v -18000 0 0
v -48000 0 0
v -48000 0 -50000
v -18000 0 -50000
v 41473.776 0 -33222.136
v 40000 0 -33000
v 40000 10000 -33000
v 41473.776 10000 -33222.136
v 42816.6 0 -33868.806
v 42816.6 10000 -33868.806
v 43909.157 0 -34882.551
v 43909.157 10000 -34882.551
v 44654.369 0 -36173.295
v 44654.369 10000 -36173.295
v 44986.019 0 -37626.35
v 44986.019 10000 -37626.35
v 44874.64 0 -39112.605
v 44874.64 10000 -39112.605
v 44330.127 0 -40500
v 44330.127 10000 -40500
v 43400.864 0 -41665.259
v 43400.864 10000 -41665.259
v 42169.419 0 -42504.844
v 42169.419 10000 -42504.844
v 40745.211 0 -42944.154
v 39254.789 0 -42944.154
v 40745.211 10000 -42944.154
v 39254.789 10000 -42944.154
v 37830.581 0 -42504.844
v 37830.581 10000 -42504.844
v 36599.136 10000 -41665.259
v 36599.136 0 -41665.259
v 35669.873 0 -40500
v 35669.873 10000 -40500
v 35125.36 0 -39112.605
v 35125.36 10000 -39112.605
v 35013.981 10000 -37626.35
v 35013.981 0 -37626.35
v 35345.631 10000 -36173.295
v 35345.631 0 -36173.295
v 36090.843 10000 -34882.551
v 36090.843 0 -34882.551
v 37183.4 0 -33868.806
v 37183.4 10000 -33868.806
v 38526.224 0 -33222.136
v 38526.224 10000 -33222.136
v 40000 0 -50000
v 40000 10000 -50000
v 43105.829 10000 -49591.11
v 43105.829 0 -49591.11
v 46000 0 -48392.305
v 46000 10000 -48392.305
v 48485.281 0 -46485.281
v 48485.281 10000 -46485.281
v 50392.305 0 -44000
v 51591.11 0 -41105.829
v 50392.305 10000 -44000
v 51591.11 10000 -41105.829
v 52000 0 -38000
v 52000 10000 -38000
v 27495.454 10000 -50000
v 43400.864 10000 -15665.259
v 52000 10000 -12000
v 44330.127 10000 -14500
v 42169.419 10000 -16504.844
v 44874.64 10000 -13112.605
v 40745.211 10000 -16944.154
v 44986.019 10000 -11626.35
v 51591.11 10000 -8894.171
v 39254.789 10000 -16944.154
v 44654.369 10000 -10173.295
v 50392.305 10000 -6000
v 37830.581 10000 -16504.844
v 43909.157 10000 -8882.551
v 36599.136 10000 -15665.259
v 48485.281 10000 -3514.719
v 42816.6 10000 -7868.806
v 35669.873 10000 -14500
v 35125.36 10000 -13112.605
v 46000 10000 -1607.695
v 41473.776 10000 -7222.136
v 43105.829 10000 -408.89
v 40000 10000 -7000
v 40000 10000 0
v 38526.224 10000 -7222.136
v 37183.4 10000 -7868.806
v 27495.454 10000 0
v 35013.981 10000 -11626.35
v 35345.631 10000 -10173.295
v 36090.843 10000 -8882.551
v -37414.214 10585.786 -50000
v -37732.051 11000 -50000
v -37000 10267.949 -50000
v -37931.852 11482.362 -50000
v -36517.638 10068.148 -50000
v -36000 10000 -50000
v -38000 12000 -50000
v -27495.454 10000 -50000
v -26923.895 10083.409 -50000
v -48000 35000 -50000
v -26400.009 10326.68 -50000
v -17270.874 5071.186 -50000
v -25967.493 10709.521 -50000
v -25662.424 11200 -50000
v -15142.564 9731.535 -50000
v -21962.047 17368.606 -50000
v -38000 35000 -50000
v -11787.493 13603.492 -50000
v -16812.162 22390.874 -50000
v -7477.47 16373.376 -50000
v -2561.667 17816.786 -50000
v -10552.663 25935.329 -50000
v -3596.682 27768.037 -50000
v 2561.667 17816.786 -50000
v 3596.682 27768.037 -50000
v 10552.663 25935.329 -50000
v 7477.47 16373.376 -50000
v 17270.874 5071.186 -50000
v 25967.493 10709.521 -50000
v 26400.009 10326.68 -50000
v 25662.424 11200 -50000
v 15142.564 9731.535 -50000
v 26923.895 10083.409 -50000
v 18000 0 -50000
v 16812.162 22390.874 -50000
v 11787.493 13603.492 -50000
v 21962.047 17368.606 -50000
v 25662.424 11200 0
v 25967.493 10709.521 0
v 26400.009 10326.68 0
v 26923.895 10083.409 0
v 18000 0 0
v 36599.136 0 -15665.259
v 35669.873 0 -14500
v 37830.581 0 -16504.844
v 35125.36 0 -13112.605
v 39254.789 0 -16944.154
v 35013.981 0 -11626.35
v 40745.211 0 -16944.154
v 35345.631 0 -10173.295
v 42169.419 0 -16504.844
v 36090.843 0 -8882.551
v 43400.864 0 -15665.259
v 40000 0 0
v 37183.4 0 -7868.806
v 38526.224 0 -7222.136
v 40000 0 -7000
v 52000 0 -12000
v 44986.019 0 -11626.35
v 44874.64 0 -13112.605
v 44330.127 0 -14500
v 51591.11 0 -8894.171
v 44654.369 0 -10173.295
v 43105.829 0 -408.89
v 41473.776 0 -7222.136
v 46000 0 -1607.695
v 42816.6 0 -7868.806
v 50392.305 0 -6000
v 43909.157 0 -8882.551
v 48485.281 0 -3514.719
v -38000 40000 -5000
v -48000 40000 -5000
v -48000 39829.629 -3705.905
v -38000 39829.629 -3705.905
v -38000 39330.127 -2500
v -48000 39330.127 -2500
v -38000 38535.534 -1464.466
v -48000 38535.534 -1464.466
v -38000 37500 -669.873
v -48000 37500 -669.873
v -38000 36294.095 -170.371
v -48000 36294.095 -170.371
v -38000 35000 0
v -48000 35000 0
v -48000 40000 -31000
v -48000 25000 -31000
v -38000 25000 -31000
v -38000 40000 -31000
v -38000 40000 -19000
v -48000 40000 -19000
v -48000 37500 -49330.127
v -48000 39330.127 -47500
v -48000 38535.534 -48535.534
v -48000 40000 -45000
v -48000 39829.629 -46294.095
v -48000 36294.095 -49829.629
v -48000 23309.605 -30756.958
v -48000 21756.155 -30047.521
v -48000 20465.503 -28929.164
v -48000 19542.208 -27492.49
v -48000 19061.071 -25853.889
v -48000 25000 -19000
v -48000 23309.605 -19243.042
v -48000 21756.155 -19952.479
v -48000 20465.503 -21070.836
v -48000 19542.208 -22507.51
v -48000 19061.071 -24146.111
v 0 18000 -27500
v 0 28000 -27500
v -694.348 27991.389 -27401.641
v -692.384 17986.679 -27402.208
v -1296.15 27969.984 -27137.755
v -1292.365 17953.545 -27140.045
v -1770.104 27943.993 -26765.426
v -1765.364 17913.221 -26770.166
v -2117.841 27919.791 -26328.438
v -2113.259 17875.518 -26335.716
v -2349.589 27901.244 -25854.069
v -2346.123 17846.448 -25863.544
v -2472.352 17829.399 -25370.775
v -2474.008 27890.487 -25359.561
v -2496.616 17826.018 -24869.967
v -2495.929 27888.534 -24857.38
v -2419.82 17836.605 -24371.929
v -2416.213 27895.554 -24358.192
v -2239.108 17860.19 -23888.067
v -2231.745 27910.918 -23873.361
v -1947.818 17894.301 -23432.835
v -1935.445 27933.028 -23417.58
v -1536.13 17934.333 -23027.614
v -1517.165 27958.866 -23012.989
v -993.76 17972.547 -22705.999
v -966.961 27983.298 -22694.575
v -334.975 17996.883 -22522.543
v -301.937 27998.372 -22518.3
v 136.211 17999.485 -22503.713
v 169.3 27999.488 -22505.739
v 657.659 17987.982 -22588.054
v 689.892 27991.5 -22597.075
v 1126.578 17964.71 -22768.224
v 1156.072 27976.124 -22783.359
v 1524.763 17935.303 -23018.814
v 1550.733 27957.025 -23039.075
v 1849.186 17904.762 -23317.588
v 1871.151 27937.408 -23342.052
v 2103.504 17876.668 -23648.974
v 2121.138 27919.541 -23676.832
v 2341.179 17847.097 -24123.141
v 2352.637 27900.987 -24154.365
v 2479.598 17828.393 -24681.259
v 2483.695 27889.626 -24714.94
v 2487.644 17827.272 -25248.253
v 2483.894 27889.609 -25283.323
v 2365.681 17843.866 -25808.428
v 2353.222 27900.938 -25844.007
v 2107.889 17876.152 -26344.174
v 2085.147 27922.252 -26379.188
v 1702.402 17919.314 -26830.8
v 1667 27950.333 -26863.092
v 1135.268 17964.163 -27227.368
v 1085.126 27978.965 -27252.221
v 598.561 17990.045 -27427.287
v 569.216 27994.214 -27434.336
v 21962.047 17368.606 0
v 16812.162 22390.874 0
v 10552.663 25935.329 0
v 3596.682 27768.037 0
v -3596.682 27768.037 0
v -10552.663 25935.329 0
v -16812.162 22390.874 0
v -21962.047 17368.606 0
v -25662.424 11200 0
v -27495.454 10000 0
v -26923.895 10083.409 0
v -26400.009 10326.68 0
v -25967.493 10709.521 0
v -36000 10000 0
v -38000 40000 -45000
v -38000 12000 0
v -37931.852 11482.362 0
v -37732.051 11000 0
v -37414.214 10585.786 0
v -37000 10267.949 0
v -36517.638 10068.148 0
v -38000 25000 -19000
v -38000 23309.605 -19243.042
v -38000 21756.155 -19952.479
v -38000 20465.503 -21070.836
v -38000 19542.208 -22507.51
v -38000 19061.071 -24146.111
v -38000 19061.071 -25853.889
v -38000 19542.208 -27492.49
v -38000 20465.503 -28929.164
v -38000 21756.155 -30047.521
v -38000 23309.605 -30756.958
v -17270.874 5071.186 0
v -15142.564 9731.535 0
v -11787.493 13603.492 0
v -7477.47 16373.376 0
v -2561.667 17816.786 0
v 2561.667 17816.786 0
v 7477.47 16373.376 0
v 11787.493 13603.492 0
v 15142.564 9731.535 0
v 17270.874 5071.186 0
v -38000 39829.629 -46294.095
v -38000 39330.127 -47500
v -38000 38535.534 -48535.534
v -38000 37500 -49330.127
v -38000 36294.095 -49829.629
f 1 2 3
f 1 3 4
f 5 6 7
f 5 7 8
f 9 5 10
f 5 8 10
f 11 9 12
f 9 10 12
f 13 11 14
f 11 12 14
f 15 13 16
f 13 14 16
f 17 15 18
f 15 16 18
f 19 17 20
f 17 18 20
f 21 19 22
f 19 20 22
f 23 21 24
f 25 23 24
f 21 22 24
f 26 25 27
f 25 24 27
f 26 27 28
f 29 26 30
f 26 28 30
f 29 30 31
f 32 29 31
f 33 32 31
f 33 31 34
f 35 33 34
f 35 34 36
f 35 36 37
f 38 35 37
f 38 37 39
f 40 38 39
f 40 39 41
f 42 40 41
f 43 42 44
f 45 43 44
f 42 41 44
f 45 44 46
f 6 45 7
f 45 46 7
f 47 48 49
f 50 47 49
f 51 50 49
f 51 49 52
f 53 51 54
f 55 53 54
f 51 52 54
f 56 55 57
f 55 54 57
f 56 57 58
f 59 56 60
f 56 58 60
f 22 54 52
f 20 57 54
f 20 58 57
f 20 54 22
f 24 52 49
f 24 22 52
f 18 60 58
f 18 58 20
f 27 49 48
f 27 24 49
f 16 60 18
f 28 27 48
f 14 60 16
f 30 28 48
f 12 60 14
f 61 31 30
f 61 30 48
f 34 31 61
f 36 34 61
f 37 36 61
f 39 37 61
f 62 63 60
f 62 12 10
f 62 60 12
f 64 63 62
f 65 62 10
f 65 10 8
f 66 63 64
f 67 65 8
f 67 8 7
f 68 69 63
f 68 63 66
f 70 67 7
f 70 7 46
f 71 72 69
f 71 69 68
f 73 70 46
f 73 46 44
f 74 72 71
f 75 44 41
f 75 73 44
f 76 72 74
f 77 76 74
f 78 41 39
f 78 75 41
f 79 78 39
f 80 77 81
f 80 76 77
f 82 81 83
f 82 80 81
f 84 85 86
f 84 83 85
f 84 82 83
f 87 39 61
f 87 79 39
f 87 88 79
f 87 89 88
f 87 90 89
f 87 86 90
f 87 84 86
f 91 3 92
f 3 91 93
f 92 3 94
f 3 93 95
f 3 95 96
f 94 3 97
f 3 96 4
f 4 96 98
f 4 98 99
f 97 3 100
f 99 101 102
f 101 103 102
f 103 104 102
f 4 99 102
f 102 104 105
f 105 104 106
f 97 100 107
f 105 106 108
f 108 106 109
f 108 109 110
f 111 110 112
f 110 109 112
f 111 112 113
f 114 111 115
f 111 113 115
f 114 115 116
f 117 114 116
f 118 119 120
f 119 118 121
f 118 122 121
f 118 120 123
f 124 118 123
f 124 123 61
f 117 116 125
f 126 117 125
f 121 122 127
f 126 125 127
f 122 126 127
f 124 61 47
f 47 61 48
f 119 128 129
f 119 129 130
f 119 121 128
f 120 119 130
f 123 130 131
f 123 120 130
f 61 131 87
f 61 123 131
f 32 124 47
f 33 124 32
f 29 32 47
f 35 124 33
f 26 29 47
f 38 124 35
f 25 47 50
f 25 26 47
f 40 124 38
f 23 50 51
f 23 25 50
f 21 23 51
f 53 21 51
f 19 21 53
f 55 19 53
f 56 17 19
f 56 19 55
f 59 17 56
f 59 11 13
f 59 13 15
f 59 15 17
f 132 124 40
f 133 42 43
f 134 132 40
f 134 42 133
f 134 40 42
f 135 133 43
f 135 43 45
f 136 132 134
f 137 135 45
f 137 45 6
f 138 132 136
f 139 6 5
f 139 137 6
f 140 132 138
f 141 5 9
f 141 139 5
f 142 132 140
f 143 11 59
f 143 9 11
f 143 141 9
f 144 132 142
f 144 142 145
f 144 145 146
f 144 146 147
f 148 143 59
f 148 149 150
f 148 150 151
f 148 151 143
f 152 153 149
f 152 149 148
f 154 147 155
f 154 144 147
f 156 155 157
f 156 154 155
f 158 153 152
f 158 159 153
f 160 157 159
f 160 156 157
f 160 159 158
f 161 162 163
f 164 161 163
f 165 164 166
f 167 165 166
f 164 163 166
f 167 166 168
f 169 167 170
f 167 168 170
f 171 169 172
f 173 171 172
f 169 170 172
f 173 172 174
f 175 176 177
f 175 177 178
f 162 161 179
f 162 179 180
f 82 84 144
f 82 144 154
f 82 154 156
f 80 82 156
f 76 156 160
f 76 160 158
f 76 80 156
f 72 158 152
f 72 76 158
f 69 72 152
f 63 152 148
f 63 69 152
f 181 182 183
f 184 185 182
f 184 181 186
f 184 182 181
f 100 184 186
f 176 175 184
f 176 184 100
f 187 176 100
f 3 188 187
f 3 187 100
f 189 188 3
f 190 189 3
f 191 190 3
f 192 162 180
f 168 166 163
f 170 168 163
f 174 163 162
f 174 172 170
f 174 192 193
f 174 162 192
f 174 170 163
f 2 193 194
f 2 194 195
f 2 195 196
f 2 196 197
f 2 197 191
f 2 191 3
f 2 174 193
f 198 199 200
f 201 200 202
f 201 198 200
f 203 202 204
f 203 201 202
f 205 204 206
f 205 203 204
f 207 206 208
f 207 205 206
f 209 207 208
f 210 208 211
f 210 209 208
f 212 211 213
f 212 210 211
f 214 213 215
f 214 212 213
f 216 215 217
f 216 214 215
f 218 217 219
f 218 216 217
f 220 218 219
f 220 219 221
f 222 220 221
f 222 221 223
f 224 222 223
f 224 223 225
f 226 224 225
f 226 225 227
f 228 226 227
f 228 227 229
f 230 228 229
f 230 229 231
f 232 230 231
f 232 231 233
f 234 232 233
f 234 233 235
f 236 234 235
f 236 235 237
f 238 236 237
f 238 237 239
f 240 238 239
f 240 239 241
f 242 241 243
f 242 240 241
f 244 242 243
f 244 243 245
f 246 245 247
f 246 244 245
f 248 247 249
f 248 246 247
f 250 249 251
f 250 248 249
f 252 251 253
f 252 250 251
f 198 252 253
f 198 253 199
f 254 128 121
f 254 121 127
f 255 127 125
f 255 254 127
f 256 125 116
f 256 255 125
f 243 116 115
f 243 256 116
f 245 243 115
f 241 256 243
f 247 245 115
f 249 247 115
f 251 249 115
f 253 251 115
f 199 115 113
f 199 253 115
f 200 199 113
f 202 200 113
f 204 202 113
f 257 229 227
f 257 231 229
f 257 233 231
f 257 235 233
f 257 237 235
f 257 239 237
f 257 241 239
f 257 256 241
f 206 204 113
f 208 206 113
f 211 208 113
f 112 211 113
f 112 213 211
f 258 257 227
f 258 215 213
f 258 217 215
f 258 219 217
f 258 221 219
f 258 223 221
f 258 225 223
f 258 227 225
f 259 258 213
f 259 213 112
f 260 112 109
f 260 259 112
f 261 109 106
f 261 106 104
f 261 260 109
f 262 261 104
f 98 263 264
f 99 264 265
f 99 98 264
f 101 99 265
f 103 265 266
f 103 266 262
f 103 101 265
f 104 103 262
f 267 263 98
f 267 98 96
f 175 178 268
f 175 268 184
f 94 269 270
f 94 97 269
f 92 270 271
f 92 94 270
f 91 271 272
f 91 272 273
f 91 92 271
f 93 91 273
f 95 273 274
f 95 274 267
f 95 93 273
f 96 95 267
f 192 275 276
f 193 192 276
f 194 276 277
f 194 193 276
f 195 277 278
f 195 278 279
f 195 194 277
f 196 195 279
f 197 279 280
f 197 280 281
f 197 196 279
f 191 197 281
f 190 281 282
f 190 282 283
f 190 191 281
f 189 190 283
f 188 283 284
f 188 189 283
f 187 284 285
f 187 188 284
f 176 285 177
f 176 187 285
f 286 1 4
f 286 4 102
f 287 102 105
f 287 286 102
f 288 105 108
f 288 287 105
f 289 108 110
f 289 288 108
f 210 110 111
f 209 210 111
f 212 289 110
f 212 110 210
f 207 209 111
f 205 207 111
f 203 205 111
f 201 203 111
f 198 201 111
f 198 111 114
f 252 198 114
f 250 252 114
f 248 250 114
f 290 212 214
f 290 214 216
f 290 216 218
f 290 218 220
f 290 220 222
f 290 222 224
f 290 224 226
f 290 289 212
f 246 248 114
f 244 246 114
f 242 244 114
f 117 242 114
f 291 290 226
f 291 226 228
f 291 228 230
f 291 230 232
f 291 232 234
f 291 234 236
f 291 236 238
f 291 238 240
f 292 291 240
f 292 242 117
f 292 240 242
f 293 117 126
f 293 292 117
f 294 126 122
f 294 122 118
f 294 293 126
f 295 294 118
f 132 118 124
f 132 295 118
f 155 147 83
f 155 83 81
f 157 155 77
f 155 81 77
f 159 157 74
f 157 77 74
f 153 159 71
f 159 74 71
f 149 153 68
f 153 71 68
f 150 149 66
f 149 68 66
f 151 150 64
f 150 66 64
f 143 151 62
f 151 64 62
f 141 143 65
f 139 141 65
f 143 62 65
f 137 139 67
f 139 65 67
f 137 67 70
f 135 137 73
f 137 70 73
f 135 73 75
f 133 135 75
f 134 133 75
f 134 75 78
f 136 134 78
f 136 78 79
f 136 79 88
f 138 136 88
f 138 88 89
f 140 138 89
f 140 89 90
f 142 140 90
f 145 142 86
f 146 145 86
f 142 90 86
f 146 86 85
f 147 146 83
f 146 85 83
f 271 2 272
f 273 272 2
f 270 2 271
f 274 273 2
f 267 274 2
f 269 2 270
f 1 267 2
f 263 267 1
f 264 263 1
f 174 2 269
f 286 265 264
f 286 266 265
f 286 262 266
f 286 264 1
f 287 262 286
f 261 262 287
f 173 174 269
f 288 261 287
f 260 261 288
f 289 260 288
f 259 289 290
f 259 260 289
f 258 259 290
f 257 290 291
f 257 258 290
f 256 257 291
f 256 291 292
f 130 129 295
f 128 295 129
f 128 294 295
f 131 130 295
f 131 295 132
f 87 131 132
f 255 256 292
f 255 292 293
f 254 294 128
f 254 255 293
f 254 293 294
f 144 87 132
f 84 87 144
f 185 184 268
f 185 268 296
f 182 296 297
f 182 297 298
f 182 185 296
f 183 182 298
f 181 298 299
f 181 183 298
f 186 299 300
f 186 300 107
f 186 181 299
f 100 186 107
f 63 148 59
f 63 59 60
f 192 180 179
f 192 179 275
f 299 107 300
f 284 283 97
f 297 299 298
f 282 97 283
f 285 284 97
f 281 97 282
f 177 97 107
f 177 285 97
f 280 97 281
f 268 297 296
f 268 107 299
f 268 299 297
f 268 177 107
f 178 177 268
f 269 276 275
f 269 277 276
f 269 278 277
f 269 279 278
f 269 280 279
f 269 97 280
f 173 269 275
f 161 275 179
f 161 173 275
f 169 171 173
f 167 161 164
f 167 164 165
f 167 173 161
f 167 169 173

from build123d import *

# Parameters (mm, degrees)
BOSS_EXTRUDE1_DEPTH = 50000
CUT_EXTRUDE1_DEPTH  = 10000
CUT_EXTRUDE2_DEPTH  = 10000
FILLET1_R           = 2000
CUT_EXTRUDE3_DEPTH  = 10000
FILLET2_R           = 2000
SKETCH5_R           = 5000
CUT_EXTRUDE4_DEPTH  = 10000
SKETCH6_R           = 2500
CUT_EXTRUDE5_DEPTH  = 100000


with BuildPart() as part:
    # Sketch1 → Boss-Extrude1 (new body)
    with BuildSketch(Plane.XY):
        with BuildLine():
            Line((18000, 0), (52000, 0))
            Line((52000, 0), (52000, 10000))
            Line((52000, 10000), (26153.393661244, 10000))
            ThreePointArc((26153.393661244, 10000), (0, 28000), (-26153.393661244, 10000))
            Line((-26153.393661244, 10000), (-38000, 10000))
            Line((-38000, 10000), (-38000, 40000))
            Line((-38000, 40000), (-48000, 40000))
            Line((-48000, 40000), (-48000, 0))
            Line((-48000, 0), (-18000, 0))
            ThreePointArc((-18000, 0), (0, 18000), (18000, 0))
        make_face()
    extrude(amount=-BOSS_EXTRUDE1_DEPTH)

    # Sketch2 → Cut-Extrude1 (cut)
    with BuildSketch(Plane.ZY.offset(48000)):
        with BuildLine():
            Line((-50000, 35000), (-50000, 40000))
            Line((-50000, 40000), (-45000, 40000))
            ThreePointArc((-45000, 40000), (-48535.533905933, 38535.533905933), (-50000, 35000))
        make_face()
        with BuildLine():
            Line((0, 35000), (0, 40000))
            Line((0, 40000), (-5000, 40000))
            ThreePointArc((-5000, 40000), (-1464.466094067, 38535.533905933), (0, 35000))
        make_face()
    extrude(amount=-CUT_EXTRUDE1_DEPTH, mode=Mode.SUBTRACT)

    # Sketch3 → Cut-Extrude2 (cut)
    with BuildSketch(Plane.ZY.offset(48000)):
        with BuildLine():
            Line((-31000, 40000), (-19000, 40000))
            Line((-19000, 40000), (-19000, 25000))
            ThreePointArc((-19000, 25000), (-25000, 19000), (-31000, 25000))
            Line((-31000, 25000), (-31000, 40000))
        make_face()
    extrude(amount=-CUT_EXTRUDE2_DEPTH, mode=Mode.SUBTRACT)

    # Fillet1
    fillet1_edges = [part.edges().sort_by_distance(p)[0] for p in [
        (-38000, 10000, -25000),
        (-26153.393661244, 10000, -25000),
    ]]
    fillet(fillet1_edges, radius=FILLET1_R)

    # Sketch4 → Cut-Extrude3 (cut)
    with BuildSketch(Plane(origin=(0, 10000, 0), x_dir=(1, 0, 0), z_dir=(0, 1, 0))):
        with BuildLine():
            Line((52000, 38000), (52000, 50000))
            Line((52000, 50000), (40000, 50000))
            ThreePointArc((40000, 50000), (48485.281374239, 46485.281374239), (52000, 38000))
        make_face()
        with BuildLine():
            Line((52000, 12000), (52000, 0))
            Line((52000, 0), (40000, 0))
            ThreePointArc((40000, 0), (48485.281374239, 3514.718625761), (52000, 12000))
        make_face()
    extrude(amount=-CUT_EXTRUDE3_DEPTH, mode=Mode.SUBTRACT)

    # Fillet2
    fillet2_edges = [part.edges().sort_by_distance(p)[0] for p in [
        (26153.393661244, 10000, -25000),
    ]]
    fillet(fillet2_edges, radius=FILLET2_R)

    # Sketch5 → Cut-Extrude4 (cut)
    with BuildSketch(Plane(origin=(0, 10000, 0), x_dir=(1, 0, 0), z_dir=(0, 1, 0))):
        with Locations(Location((40000, 12000, 0), (0, 0, 270))):
            Circle(SKETCH5_R)
        with Locations(Location((40000, 38000, 0), (0, 0, 270))):
            Circle(SKETCH5_R)
    extrude(amount=-CUT_EXTRUDE4_DEPTH, mode=Mode.SUBTRACT)

    # Sketch6 → Cut-Extrude5 (cut)
    with BuildSketch(Plane(origin=(0, 0, 0), x_dir=(1, 0, 0), z_dir=(0, 1, 0))):
        with Locations(Location((0, 25000, 0), (0, 0, 90))):
            Circle(SKETCH6_R)
    extrude(amount=CUT_EXTRUDE5_DEPTH, mode=Mode.SUBTRACT)


solid = part.part
